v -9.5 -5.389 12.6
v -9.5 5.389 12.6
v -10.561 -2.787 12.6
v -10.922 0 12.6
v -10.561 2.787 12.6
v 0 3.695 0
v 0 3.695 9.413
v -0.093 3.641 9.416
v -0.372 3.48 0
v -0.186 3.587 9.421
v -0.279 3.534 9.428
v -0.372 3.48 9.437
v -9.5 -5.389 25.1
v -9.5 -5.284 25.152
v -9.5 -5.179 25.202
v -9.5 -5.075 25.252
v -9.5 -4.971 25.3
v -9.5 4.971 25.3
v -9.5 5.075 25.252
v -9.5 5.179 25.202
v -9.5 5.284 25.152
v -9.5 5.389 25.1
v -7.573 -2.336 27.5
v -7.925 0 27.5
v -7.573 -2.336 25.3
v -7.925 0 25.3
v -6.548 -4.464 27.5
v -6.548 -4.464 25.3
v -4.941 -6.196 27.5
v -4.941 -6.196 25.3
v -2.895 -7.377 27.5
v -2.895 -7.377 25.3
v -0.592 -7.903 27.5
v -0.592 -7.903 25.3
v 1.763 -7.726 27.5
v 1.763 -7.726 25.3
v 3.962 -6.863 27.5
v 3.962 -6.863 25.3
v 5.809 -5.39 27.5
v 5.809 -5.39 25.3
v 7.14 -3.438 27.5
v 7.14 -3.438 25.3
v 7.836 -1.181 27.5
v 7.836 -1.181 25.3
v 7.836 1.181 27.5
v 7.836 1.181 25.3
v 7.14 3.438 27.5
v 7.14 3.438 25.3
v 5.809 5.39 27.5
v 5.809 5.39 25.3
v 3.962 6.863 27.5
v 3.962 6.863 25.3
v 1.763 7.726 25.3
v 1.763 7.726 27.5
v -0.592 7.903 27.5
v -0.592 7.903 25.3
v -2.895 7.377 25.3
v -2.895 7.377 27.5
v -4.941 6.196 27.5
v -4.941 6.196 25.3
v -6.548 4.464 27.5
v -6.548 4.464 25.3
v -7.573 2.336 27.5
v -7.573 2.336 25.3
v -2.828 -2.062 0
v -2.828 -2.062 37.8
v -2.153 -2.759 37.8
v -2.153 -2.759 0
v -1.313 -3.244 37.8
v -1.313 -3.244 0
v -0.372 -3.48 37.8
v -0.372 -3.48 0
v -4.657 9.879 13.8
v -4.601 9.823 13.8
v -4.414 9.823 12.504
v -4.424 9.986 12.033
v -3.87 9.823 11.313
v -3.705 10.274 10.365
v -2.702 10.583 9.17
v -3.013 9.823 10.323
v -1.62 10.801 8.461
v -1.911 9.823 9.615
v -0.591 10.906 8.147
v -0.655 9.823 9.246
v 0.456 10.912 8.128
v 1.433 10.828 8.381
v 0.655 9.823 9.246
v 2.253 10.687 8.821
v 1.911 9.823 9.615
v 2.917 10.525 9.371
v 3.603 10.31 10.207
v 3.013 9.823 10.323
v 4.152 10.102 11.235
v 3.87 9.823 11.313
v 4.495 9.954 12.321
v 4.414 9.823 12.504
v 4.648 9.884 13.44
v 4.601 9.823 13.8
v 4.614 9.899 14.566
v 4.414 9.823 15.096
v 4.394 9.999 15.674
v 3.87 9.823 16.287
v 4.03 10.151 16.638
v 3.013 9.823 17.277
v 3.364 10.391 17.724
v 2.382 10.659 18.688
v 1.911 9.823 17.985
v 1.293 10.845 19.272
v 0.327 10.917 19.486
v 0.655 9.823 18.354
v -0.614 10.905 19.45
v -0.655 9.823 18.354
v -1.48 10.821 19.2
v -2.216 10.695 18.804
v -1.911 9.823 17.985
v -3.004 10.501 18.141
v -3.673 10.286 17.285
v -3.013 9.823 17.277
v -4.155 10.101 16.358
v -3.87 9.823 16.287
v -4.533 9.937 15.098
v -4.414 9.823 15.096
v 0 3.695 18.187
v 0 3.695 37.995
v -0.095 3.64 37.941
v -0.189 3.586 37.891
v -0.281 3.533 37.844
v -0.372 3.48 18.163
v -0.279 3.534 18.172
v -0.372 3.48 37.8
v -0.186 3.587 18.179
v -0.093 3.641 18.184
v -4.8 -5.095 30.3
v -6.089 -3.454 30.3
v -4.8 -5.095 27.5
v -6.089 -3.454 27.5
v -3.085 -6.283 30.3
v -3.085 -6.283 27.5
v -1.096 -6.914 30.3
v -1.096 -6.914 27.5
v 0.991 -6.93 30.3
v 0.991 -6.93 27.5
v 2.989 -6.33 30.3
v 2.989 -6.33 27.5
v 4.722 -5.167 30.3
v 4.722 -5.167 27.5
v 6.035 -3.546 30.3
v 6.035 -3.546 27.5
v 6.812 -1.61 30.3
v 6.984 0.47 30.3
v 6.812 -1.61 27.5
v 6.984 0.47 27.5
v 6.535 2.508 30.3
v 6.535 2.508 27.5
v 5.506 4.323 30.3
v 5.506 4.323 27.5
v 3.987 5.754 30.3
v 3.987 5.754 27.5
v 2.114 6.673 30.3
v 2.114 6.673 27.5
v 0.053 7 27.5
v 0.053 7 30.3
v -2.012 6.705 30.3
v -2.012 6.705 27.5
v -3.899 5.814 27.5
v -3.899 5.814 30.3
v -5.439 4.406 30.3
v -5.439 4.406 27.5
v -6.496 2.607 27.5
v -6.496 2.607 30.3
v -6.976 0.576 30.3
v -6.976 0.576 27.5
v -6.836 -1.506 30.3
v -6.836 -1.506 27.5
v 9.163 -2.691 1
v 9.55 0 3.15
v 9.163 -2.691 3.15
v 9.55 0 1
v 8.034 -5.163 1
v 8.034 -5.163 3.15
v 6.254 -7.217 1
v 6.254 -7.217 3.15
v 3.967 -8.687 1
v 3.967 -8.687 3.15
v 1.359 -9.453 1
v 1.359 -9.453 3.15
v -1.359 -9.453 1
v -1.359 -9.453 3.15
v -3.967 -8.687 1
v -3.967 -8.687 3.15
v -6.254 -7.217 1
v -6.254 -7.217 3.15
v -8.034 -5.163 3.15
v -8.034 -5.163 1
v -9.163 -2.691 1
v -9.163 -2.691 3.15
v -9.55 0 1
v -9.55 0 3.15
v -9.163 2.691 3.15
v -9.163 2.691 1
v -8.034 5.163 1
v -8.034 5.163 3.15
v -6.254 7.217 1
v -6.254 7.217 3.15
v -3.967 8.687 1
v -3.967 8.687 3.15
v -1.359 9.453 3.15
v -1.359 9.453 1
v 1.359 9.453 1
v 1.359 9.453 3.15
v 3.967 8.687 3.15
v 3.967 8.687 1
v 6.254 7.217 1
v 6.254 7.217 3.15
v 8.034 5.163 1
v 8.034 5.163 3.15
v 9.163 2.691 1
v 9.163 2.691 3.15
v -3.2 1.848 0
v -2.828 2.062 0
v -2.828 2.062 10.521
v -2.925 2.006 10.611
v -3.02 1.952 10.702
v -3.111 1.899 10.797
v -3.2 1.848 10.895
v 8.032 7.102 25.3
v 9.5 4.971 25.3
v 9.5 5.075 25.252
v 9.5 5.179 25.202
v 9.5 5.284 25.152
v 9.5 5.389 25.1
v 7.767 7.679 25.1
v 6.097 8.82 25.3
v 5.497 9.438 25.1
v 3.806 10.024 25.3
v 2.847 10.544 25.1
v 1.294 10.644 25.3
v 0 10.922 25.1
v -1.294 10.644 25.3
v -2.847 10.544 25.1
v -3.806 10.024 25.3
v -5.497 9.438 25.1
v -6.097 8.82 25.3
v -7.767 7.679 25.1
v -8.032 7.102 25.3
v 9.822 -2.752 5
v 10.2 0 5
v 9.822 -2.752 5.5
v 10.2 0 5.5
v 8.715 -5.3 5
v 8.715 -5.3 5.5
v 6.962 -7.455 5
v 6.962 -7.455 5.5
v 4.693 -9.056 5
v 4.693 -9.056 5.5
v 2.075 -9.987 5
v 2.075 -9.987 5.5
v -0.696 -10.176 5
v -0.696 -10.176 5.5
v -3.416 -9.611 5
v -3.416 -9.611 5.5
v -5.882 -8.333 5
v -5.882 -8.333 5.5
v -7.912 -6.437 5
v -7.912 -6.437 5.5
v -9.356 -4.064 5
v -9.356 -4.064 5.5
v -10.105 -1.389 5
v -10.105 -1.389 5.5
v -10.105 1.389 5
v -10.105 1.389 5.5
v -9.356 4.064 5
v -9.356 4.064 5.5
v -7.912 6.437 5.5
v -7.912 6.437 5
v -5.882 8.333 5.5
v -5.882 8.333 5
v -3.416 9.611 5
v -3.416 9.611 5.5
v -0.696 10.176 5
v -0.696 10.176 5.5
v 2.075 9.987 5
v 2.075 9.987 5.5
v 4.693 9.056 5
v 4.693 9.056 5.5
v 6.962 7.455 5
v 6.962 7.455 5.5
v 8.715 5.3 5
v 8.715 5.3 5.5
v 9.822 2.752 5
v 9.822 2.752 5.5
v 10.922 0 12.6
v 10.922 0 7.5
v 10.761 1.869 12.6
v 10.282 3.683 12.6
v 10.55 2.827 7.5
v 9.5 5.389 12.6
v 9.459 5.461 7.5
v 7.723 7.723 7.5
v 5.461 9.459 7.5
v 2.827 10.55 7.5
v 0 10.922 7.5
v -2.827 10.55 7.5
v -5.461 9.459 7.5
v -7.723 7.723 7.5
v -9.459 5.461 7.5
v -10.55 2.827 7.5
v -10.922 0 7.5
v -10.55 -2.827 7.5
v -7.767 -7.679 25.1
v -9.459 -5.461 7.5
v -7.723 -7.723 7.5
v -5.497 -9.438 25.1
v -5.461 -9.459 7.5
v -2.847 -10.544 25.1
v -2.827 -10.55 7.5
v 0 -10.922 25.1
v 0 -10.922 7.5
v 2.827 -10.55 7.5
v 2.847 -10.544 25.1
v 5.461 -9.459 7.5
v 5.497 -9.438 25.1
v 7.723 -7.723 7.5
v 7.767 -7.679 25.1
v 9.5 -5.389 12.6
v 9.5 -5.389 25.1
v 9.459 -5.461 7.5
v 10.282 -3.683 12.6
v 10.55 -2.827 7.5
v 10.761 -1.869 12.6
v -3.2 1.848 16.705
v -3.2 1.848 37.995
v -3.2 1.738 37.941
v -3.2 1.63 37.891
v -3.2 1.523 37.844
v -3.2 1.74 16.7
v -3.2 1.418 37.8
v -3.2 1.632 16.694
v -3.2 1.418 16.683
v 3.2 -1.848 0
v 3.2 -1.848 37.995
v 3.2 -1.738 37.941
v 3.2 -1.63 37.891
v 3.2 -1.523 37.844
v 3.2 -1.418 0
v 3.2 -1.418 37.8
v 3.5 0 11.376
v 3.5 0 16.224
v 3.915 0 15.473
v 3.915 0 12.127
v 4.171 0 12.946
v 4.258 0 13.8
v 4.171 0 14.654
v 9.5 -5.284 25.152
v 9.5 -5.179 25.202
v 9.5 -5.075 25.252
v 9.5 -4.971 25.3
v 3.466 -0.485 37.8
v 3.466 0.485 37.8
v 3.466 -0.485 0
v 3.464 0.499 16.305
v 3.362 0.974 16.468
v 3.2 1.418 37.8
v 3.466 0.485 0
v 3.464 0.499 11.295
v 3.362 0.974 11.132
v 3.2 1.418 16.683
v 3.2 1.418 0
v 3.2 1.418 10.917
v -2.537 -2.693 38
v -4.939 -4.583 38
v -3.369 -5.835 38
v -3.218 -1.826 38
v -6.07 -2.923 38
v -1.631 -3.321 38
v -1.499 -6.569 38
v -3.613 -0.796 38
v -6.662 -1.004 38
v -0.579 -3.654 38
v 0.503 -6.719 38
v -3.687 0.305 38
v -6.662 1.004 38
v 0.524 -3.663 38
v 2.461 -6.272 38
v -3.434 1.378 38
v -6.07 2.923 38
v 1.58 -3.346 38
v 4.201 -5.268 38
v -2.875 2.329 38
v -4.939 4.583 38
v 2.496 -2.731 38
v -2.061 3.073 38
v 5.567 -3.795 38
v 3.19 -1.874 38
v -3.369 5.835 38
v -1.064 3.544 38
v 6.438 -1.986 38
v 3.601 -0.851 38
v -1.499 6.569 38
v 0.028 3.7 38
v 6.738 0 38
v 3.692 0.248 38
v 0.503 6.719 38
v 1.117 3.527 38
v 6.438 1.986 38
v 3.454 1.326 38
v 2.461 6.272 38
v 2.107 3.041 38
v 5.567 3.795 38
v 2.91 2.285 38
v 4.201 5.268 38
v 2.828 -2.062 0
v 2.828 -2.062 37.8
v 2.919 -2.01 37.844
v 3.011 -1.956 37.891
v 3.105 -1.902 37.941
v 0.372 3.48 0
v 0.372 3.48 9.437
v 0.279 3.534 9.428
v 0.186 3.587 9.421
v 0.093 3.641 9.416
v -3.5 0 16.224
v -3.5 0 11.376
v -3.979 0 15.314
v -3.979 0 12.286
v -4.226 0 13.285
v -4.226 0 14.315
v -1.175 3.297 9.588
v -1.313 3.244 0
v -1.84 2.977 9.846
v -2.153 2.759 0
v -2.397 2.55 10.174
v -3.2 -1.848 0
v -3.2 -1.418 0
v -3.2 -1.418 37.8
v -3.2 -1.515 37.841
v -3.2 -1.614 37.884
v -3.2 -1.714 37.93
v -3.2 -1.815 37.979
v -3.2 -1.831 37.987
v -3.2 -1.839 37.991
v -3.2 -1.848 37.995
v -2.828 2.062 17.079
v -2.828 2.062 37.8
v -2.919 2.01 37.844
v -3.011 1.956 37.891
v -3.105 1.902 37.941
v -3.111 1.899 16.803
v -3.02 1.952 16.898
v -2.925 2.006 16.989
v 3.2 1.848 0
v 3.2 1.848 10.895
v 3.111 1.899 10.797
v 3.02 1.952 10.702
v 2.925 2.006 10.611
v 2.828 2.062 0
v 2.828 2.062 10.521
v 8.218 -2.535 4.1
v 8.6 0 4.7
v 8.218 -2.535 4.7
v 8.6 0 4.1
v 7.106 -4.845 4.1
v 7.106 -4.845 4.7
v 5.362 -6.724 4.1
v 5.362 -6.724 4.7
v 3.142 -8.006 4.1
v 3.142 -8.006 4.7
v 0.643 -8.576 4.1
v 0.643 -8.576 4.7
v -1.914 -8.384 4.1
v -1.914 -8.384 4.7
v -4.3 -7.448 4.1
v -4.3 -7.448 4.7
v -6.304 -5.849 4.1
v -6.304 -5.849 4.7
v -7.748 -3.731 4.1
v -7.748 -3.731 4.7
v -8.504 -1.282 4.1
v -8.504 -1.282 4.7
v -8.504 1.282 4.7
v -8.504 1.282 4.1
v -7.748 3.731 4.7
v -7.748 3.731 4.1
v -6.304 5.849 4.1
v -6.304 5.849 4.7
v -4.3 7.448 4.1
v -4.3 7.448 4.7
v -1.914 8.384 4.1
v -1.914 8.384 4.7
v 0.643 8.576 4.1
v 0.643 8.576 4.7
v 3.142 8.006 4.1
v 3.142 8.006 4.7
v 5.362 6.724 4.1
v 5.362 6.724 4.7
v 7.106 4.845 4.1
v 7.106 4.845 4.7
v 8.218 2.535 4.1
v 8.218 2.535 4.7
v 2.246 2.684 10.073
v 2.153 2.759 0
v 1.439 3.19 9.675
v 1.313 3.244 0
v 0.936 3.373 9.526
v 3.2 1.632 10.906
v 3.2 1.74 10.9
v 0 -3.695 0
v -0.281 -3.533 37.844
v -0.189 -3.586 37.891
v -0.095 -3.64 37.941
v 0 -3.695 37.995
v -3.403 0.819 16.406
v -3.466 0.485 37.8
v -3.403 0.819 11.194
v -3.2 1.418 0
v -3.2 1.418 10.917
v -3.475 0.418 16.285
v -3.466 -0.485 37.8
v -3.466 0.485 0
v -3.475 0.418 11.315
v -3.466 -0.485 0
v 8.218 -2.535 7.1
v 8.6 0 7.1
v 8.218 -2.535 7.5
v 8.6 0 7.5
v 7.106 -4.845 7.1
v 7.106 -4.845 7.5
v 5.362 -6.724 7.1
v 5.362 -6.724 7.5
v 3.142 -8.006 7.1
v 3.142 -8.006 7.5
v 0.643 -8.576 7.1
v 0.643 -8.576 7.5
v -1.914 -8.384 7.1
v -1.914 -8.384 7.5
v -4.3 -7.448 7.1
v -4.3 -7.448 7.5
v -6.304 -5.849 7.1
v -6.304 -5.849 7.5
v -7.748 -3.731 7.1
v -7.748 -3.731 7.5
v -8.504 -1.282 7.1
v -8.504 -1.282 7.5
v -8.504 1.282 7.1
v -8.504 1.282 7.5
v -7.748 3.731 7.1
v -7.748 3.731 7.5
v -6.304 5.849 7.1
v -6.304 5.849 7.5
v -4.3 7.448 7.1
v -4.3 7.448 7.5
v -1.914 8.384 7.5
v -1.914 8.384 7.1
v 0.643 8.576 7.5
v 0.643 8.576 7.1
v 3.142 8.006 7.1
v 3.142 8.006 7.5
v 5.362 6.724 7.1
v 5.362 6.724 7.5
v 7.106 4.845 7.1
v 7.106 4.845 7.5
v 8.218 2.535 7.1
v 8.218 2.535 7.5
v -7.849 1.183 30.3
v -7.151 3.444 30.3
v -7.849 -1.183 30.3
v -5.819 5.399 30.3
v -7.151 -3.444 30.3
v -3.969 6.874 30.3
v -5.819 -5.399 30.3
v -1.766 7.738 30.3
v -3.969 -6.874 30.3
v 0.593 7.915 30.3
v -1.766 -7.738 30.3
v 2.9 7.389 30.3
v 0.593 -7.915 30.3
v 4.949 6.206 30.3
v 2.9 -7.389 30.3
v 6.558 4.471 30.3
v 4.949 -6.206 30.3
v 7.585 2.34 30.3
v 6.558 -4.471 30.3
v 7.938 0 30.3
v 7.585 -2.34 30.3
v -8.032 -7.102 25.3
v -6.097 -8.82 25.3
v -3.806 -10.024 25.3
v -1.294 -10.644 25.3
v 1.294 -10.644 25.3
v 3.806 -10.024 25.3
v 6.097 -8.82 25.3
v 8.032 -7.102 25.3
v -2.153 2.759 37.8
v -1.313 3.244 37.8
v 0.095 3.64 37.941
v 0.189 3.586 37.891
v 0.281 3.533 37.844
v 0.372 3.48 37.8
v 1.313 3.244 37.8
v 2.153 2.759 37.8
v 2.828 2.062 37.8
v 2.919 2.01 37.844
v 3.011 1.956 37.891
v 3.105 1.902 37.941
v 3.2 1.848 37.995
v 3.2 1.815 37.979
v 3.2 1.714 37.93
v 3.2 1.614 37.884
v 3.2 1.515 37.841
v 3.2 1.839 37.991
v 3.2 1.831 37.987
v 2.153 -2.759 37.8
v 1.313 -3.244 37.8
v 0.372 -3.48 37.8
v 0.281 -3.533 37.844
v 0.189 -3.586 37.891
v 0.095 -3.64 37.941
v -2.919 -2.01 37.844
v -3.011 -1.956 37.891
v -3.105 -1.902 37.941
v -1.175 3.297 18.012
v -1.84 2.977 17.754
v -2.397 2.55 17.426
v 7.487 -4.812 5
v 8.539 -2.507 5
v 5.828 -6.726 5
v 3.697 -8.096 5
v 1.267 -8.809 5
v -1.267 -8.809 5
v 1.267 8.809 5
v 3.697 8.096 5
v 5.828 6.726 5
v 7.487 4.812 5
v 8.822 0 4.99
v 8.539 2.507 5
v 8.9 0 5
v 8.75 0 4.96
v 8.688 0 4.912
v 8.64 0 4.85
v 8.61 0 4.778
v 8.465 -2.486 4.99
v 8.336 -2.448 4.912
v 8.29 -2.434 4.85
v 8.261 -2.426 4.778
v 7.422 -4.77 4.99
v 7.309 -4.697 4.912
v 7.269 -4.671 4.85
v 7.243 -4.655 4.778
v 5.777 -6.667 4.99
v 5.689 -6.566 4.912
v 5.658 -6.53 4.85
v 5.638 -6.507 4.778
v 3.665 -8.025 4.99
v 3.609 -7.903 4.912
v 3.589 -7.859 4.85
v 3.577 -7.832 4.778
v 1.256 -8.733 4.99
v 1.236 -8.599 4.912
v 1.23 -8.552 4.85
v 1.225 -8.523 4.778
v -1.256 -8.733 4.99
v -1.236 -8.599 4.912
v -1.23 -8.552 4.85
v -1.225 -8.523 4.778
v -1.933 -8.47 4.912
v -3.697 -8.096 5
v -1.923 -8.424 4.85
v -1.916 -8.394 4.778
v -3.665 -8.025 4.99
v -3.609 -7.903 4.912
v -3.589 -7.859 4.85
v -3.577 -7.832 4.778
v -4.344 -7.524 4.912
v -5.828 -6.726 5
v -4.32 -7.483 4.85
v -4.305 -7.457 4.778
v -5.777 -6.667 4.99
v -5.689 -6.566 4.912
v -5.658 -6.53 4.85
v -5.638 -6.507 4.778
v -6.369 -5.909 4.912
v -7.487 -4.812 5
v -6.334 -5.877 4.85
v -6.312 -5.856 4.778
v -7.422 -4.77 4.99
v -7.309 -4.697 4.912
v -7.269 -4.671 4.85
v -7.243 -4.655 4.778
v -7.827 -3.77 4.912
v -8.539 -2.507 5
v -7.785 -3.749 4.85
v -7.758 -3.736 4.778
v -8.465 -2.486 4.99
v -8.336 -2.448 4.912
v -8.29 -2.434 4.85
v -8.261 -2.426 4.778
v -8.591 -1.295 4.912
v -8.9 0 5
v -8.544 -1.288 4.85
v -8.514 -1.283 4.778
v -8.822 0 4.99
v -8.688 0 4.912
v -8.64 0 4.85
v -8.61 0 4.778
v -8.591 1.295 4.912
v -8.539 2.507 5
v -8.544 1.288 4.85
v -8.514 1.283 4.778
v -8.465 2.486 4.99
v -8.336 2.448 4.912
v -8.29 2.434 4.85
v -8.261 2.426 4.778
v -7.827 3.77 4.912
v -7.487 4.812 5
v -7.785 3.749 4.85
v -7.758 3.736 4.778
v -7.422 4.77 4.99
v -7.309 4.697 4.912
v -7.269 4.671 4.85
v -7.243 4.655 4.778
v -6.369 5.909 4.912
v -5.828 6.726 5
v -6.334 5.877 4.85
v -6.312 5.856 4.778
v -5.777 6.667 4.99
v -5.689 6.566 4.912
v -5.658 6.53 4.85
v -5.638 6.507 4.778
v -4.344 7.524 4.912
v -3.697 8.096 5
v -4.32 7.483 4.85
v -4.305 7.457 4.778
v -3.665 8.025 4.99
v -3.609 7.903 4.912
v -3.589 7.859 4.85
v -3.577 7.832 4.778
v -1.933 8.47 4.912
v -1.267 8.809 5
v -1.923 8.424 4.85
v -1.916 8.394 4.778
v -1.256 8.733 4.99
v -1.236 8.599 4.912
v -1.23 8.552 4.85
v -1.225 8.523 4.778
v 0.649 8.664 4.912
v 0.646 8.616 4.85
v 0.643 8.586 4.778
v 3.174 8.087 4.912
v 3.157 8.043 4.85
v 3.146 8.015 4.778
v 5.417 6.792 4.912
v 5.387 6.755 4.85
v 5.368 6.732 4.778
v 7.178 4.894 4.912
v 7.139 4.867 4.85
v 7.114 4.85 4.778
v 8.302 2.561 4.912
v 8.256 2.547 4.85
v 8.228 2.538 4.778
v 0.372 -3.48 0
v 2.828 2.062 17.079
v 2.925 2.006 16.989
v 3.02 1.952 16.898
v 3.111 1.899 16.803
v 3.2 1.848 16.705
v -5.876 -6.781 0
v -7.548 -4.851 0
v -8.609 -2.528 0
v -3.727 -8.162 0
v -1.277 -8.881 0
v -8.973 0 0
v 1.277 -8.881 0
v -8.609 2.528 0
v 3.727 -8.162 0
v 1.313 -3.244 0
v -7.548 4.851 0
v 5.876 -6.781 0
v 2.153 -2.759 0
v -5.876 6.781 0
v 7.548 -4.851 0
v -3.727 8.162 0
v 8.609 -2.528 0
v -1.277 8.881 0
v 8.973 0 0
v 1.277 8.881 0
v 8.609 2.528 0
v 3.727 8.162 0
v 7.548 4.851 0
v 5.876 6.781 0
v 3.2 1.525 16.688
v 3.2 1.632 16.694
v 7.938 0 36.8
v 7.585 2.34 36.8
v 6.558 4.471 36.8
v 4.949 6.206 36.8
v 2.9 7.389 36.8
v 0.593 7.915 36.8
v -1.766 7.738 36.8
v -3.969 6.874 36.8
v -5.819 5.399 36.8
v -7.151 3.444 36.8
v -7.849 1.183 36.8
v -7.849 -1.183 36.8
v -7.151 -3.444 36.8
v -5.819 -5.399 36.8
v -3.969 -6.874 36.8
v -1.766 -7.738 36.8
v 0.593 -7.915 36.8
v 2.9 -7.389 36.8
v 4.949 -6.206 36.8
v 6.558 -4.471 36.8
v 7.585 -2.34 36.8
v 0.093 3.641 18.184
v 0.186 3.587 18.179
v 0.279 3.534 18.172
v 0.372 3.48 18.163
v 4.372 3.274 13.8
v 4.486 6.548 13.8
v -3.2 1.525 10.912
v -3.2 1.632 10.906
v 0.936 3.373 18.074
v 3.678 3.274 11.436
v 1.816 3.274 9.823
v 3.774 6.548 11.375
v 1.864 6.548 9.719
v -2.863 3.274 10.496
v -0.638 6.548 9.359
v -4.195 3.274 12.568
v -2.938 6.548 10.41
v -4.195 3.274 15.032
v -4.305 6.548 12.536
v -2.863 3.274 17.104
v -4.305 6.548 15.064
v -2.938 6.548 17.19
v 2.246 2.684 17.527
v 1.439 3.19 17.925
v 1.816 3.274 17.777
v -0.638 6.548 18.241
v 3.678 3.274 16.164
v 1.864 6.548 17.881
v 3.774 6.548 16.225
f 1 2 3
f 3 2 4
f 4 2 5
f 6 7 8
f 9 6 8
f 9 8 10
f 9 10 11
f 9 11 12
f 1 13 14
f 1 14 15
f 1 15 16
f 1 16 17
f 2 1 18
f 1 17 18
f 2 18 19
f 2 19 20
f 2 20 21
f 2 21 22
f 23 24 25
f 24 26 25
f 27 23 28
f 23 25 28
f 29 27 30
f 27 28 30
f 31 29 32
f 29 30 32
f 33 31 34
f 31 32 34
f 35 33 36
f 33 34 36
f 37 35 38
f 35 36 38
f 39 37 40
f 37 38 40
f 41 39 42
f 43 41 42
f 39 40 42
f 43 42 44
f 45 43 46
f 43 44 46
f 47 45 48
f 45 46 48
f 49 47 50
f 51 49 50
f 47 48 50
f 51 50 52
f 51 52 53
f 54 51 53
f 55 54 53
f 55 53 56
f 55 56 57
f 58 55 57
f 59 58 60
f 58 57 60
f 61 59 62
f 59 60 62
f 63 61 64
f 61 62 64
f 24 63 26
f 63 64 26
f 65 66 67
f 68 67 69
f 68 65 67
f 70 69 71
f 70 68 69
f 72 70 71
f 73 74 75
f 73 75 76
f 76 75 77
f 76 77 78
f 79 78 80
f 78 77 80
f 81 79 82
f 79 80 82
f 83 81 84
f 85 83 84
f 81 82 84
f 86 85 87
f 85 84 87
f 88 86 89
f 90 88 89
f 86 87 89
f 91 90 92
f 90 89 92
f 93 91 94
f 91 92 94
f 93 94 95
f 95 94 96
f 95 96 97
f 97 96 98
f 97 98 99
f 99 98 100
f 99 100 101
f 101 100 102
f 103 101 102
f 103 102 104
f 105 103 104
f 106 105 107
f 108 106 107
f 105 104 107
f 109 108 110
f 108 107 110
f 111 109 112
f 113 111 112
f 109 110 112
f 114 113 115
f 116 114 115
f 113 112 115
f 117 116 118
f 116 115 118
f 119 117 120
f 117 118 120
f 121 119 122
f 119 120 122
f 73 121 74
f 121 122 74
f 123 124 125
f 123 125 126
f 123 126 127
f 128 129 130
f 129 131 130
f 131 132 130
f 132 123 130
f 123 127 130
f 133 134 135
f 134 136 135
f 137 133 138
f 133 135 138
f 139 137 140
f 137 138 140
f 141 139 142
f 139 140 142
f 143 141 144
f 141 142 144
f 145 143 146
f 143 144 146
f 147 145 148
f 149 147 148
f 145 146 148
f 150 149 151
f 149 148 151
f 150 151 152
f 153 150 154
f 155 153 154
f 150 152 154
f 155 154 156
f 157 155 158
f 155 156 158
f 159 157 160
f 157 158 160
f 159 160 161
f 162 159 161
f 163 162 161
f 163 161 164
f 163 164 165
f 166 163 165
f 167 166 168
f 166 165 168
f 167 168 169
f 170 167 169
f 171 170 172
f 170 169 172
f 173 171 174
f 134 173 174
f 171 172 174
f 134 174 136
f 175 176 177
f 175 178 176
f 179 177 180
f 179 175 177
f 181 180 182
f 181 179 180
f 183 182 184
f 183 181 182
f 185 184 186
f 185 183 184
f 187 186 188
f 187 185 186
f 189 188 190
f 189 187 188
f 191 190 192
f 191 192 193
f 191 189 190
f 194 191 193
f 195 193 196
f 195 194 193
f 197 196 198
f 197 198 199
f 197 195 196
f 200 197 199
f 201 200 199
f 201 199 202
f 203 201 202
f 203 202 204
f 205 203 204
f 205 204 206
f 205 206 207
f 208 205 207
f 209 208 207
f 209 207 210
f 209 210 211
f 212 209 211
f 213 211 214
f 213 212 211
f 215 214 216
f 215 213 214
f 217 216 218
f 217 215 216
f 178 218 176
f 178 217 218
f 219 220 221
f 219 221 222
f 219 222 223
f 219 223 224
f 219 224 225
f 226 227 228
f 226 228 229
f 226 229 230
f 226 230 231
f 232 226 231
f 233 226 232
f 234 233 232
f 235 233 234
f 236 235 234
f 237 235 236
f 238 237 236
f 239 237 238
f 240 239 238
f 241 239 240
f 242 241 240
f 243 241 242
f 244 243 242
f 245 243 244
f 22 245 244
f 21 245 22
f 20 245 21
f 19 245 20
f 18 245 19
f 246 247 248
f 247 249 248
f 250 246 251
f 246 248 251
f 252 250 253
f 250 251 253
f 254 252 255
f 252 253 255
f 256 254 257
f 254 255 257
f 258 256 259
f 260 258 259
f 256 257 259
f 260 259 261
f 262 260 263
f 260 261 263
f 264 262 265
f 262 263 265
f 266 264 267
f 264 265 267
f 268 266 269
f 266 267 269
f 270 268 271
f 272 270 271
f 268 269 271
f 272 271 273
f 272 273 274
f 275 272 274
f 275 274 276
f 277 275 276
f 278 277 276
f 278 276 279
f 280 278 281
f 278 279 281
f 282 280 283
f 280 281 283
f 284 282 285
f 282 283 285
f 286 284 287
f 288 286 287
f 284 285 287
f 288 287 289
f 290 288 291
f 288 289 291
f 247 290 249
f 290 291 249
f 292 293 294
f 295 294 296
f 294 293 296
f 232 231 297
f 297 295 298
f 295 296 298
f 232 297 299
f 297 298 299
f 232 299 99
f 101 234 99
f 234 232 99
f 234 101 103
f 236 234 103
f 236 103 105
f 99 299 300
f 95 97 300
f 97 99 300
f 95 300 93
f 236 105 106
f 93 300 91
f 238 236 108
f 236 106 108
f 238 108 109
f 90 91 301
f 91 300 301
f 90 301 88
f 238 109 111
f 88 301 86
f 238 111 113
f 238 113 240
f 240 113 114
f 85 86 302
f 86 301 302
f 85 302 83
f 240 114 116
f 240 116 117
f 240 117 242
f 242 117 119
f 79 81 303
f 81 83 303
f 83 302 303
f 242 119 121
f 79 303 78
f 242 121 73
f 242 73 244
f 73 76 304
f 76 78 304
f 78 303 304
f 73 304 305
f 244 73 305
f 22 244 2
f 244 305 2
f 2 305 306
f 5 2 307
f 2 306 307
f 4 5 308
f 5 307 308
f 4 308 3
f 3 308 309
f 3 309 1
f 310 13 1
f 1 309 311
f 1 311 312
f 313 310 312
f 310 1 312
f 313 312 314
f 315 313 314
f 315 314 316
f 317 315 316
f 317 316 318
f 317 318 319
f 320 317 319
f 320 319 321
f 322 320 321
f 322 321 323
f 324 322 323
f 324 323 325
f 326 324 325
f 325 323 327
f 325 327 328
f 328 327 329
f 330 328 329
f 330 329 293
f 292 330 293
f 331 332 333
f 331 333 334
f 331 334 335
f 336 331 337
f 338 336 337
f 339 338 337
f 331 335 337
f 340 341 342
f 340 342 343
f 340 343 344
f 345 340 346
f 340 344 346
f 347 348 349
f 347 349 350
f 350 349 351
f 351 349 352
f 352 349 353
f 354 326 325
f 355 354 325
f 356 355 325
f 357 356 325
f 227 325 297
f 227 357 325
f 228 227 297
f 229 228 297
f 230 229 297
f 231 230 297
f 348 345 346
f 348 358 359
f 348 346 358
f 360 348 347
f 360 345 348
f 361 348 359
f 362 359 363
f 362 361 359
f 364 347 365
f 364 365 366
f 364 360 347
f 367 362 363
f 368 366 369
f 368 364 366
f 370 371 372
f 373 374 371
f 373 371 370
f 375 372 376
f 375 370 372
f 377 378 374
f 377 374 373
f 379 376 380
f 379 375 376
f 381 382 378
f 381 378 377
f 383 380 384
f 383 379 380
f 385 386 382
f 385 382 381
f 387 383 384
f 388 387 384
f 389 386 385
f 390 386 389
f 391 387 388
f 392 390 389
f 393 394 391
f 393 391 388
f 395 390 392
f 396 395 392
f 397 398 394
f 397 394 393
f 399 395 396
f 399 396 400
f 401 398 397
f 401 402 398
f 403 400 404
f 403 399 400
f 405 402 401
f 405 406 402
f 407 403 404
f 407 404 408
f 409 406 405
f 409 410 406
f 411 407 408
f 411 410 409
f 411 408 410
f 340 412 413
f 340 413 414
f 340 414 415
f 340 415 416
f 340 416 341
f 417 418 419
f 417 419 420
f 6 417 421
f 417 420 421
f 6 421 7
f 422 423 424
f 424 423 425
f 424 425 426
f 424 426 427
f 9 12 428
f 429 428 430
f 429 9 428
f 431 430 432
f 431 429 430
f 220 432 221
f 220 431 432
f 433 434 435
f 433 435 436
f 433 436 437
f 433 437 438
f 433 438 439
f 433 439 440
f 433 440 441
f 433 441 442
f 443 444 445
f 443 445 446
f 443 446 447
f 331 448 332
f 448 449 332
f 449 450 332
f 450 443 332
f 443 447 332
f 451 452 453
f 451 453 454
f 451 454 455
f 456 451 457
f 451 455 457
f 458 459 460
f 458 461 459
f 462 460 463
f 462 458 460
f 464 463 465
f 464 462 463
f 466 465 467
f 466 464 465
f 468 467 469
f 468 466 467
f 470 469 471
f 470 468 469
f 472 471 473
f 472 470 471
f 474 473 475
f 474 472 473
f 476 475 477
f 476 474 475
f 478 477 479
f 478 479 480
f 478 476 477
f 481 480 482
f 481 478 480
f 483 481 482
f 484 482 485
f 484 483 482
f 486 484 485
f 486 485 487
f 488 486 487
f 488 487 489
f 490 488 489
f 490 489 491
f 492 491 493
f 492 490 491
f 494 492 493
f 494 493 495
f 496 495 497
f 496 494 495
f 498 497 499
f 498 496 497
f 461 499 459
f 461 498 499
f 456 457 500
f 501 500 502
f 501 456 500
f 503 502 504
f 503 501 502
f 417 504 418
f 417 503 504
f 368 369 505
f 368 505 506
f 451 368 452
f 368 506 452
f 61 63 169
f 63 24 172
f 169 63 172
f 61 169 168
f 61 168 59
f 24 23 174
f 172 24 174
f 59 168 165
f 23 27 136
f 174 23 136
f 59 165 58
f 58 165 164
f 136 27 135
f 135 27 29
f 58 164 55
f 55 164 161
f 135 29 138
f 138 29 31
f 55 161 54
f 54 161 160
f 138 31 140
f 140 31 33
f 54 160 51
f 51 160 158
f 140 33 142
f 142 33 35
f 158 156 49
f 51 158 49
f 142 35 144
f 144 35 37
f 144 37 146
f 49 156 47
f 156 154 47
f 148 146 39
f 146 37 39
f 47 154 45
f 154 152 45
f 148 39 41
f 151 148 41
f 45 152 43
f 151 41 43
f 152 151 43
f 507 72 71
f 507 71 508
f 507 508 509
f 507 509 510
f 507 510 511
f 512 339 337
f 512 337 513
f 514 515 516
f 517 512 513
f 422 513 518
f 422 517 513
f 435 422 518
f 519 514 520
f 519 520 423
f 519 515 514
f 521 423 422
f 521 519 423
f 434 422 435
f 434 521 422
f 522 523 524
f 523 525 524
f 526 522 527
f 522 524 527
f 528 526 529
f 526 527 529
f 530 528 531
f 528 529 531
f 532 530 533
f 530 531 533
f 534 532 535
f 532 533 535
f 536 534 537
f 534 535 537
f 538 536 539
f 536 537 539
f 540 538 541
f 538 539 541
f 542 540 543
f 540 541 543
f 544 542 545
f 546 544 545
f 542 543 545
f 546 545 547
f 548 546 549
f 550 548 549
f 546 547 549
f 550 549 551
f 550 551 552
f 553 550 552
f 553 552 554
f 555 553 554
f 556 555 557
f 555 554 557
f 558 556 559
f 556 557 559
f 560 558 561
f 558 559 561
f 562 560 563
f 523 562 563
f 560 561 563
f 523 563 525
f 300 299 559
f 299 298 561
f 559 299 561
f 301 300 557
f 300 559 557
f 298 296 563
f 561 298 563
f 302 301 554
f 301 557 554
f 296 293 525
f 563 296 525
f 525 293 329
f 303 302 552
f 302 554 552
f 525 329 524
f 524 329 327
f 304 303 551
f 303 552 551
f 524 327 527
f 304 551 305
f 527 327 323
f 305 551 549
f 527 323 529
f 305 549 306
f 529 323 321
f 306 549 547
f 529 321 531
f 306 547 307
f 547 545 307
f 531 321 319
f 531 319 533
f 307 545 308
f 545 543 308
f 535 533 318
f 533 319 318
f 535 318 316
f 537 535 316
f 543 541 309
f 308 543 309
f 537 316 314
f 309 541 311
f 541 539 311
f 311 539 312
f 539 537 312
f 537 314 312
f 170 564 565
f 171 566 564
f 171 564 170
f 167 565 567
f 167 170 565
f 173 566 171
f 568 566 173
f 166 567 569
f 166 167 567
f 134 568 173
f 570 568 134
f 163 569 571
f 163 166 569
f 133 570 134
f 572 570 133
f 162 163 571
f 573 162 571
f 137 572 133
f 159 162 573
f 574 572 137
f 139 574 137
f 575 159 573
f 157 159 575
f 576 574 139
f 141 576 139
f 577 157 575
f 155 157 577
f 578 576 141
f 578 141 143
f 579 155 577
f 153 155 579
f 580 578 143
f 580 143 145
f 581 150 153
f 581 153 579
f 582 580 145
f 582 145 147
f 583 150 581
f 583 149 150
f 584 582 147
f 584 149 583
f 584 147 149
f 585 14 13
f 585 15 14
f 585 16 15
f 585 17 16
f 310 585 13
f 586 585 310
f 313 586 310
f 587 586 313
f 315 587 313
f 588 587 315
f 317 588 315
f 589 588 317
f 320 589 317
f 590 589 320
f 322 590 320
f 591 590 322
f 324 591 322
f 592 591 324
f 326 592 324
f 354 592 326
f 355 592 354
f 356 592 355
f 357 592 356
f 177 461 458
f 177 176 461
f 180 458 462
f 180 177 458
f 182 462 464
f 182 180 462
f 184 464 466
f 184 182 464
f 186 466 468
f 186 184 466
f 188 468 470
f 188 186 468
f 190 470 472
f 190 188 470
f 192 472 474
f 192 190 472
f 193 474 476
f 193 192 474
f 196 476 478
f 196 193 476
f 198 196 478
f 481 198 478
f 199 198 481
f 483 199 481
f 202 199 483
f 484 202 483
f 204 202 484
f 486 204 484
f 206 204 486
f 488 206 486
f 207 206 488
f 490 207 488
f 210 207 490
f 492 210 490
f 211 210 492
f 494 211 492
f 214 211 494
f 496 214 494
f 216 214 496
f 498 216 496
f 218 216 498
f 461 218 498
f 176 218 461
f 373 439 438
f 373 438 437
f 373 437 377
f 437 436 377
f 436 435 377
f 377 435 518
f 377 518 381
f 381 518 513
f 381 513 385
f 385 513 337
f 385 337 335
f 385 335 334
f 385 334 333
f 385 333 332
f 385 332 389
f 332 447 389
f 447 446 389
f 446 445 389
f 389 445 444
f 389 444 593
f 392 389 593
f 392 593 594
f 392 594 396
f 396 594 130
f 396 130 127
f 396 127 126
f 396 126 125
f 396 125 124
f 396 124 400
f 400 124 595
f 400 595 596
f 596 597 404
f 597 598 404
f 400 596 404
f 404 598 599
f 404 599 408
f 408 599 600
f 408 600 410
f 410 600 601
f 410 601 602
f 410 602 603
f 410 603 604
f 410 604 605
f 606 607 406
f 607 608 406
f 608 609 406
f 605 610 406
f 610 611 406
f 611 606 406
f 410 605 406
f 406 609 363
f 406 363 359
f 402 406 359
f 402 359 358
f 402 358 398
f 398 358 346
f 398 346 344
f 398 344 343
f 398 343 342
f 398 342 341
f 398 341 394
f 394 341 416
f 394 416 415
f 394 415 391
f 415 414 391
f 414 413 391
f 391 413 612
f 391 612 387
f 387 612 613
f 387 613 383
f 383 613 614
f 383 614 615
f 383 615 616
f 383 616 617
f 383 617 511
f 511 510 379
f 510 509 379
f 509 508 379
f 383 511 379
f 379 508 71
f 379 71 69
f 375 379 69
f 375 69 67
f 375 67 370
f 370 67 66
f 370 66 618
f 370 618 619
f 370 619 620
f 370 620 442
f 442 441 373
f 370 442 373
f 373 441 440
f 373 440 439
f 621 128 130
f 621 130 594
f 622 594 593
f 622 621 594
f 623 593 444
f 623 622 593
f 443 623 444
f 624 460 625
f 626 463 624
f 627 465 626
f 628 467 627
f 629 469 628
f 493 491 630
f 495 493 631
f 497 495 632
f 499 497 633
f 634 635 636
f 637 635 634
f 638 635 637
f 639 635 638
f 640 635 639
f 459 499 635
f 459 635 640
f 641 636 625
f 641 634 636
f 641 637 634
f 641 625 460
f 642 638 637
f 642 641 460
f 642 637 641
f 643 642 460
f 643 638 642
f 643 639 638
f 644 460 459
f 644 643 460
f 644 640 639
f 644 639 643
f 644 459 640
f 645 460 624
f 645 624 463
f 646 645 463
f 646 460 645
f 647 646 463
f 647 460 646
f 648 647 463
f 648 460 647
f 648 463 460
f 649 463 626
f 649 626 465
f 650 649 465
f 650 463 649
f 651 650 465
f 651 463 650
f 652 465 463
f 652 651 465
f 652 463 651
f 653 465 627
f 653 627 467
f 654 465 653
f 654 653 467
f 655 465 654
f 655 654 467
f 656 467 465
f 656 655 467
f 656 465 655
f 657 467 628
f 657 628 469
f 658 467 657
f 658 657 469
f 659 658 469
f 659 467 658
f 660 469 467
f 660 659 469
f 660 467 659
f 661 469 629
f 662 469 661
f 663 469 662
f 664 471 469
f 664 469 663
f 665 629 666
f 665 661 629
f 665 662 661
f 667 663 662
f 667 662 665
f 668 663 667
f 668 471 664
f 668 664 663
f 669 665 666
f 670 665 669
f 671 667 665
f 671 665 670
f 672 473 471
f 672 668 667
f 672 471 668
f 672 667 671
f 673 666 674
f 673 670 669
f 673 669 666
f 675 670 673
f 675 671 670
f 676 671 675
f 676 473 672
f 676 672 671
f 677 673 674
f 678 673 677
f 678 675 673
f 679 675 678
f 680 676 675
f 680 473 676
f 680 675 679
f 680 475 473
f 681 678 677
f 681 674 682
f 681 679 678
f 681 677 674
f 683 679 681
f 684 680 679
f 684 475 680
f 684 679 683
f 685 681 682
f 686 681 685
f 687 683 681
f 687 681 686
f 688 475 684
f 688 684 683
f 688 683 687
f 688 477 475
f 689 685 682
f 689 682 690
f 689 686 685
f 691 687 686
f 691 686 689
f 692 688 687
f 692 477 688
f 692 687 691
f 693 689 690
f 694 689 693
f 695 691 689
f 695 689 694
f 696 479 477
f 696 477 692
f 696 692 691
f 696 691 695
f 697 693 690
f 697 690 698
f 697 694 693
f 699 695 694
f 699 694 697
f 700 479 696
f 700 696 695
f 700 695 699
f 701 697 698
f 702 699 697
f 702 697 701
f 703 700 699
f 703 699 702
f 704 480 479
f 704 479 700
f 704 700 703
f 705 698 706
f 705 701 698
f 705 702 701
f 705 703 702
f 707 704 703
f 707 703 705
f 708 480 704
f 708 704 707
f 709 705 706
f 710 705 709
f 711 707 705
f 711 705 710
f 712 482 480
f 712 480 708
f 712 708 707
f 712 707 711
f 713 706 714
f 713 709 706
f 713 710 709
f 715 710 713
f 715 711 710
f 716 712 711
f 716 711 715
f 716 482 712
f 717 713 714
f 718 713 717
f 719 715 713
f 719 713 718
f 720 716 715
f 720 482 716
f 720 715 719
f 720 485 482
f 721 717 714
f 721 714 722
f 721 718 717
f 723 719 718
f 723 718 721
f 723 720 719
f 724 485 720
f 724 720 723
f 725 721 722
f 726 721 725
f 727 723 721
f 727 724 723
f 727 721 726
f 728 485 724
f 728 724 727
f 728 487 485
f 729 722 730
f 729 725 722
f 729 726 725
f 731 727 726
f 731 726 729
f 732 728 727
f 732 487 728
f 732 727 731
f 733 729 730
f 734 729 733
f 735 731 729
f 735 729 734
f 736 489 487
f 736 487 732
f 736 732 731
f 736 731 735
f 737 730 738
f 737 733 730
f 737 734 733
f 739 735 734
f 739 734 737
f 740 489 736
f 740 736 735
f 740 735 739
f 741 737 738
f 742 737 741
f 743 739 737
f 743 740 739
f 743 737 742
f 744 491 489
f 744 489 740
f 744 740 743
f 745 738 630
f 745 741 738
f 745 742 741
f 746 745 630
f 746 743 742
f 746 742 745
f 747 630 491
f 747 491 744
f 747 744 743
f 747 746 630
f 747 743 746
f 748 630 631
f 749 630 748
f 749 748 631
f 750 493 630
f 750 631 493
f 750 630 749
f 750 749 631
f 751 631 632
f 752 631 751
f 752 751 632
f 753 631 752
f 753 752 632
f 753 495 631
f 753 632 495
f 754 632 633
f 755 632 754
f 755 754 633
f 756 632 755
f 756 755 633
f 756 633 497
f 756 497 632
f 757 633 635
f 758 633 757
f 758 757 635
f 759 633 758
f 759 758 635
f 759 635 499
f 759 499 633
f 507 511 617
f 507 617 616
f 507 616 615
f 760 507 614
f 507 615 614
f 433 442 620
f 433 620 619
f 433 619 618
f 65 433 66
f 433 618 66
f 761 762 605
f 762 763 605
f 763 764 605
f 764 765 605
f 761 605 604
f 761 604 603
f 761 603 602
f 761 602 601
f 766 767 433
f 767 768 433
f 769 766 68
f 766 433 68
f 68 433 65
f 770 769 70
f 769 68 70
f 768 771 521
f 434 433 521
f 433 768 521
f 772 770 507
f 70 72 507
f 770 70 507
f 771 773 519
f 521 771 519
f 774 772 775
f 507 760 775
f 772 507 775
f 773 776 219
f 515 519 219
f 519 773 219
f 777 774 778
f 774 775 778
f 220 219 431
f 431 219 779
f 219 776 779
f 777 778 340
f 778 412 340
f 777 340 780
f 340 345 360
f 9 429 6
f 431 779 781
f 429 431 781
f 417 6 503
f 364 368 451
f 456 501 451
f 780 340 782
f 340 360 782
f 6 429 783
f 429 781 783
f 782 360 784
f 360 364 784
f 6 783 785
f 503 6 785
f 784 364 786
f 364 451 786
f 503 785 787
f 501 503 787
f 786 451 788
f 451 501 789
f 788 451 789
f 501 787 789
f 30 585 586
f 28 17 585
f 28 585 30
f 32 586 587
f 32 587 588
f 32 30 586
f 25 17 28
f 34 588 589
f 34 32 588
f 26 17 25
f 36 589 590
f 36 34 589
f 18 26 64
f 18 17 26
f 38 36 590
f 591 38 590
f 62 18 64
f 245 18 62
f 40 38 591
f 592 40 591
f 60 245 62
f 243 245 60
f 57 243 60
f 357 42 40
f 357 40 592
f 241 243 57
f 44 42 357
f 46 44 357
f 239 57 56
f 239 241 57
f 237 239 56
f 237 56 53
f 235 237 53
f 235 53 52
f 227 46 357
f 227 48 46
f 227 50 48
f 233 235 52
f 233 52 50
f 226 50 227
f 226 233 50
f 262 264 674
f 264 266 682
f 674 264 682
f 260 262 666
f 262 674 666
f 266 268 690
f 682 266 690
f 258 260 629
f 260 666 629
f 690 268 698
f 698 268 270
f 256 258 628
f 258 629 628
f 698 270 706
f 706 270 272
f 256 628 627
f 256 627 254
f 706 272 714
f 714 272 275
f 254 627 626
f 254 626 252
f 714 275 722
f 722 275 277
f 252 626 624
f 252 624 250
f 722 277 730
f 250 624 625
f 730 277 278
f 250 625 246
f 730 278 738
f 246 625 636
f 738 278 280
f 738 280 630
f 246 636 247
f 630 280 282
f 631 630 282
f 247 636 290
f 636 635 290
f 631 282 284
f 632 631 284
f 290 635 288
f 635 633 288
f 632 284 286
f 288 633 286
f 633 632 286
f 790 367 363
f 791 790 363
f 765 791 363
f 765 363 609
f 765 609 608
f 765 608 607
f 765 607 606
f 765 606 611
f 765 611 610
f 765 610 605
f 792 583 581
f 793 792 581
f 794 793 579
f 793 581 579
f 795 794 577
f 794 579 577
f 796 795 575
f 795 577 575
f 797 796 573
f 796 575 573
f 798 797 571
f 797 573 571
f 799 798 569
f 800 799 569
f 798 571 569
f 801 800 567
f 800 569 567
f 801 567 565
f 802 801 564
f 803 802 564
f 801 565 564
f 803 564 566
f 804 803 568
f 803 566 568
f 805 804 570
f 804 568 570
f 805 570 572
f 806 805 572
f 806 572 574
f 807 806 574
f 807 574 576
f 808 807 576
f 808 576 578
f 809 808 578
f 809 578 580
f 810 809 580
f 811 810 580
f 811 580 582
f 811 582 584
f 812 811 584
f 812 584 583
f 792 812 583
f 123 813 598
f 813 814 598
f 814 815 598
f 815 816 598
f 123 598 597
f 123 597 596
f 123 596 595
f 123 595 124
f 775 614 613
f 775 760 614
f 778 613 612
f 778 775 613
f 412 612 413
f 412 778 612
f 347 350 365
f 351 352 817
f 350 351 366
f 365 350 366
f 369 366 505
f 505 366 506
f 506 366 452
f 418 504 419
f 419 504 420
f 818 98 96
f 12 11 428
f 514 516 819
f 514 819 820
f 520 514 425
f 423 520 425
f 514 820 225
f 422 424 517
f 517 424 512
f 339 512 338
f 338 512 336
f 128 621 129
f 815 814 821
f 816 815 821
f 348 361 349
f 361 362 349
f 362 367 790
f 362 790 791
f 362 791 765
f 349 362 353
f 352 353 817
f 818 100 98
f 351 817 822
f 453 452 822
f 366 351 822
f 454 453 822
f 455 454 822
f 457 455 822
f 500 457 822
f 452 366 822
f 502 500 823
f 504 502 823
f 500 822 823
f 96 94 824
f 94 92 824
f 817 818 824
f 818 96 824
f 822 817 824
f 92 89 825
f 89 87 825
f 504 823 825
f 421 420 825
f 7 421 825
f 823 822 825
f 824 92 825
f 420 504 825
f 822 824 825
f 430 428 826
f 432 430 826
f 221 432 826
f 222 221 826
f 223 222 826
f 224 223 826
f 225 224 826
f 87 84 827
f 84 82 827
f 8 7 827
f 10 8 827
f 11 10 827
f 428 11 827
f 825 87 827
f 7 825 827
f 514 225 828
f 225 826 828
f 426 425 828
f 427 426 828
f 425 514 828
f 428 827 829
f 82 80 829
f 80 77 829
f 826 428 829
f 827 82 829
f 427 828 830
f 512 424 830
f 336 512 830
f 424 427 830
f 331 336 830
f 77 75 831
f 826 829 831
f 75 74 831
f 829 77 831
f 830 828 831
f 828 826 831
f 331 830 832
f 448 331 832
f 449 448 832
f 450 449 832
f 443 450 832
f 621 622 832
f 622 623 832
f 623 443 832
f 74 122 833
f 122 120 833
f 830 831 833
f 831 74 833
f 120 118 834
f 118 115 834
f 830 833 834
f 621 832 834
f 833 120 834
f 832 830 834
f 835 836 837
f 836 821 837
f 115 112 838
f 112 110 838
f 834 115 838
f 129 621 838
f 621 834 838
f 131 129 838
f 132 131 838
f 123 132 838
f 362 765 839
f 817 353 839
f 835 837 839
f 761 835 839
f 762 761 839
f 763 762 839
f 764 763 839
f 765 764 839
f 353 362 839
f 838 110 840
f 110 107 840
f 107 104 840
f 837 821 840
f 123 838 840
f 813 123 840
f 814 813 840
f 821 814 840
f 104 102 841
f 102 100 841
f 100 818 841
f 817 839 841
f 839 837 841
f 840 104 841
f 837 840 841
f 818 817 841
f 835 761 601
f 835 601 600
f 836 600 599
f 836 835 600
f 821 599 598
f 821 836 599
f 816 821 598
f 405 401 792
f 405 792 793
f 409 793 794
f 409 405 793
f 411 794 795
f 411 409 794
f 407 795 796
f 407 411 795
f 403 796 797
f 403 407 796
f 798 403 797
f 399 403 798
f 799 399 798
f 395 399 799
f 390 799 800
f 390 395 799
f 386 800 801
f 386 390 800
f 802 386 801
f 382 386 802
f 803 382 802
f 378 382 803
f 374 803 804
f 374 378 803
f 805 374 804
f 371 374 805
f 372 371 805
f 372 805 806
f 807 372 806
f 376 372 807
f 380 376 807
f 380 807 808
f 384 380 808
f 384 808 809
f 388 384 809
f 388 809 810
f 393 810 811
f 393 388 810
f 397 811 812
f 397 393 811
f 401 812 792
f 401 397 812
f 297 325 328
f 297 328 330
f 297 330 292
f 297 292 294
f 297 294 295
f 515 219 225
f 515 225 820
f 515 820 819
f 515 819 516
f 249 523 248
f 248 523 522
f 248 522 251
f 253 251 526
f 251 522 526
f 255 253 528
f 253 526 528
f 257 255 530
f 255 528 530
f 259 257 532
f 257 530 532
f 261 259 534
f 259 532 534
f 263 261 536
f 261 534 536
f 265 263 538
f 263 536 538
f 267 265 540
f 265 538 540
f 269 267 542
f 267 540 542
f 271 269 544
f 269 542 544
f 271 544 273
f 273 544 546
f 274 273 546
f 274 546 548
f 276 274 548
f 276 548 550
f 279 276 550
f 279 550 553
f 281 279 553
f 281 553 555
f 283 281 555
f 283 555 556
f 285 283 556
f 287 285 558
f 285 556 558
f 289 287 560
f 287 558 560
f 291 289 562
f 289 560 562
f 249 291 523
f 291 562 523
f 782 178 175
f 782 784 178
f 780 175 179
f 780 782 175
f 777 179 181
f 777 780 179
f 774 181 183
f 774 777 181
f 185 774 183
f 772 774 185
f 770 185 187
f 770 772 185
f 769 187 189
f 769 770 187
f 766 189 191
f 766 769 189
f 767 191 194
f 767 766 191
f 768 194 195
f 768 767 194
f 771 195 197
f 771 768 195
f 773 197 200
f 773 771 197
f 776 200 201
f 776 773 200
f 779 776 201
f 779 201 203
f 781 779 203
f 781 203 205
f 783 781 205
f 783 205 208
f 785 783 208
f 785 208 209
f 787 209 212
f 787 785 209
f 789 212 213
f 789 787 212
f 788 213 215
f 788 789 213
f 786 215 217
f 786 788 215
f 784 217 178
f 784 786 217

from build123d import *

# Parameters (mm, degrees)
SKETCH1_R               = 9.55
TUBEINTERFACE1_DEPTH    = 5
SKETCH3_R               = 10.922
BODY_DEPTH              = 20.3
BODYCHAMFER_SIZE        = 0.2
SKETCH4_W               = 10
SKETCH4_H               = 75
FLATS_DEPTH             = 12.7
SKETCH5_R               = 7.9375
MOUNTTHREAD1_DEPTH      = 12.7
MOUNTTHREADCHAMFER_SIZE = 1.2
SKETCH17_W              = 2.8
SKETCH17_H              = 5
SKETCH8_R               = 3.5
THRUBORE_DEPTH          = 42.019265815
THRUBORE2_DEPTH         = 38
SKETCH16_R              = 4.639
PORT2_DEPTH             = 10.922
PORT2_DRAFT             = -2
SKETCH26_W              = 2.2
SKETCH26_H              = 0.0127


with BuildPart() as part:
    # Sketch1 → TubeInterface1 (new body)
    with BuildSketch(Plane.XY):
        Circle(SKETCH1_R)
    extrude(amount=TUBEINTERFACE1_DEPTH)

    # Sketch3 → Body (add)
    with BuildSketch(Plane.XY.offset(5)):
        Circle(SKETCH3_R)
    extrude(amount=BODY_DEPTH)

    # BodyChamfer
    bodychamfer_edges = [part.edges().sort_by_distance(p)[0] for p in [
        (-10.922, 0, 25.3),
    ]]
    chamfer(bodychamfer_edges, length=BODYCHAMFER_SIZE)

    # Sketch4 → Flats (cut)
    with BuildSketch(Plane.XY.offset(25.3)):
        with Locations((-14.5, 0)):
            Rectangle(SKETCH4_W, SKETCH4_H)
        with Locations((14.5, 0)):
            Rectangle(SKETCH4_W, SKETCH4_H)
    extrude(amount=-FLATS_DEPTH, mode=Mode.SUBTRACT)

    # Sketch5 → MountThread1 (add)
    with BuildSketch(Plane.XY.offset(25.3)):
        Circle(SKETCH5_R)
    extrude(amount=MOUNTTHREAD1_DEPTH)

    # MountThreadChamfer
    mountthreadchamfer_edges = [part.edges().sort_by_distance(p)[0] for p in [
        (-7.9375, 0, 38),
    ]]
    chamfer(mountthreadchamfer_edges, length=MOUNTTHREADCHAMFER_SIZE)

    # Sketch17 → Cut-Revolve1 (revolve, cut)
    with BuildSketch(Plane(origin=(0, 0, 0), x_dir=(0, 0, -1), z_dir=(1, 0, 0)), mode=Mode.PRIVATE) as cut_revolve1_sk:
        with Locations((-28.9, 9.5)):
            Rectangle(SKETCH17_W, SKETCH17_H)
    revolve(cut_revolve1_sk.sketch.rotate(Axis((0, 0, 0), (0, 0, 1)), 119.564121408), axis=Axis((0, 0, 0), (0, 0, 1)), mode=Mode.SUBTRACT)

    # Sketch8 → ThruBore (cut, through all)
    with BuildSketch(Plane.XY):
        Circle(SKETCH8_R)
    extrude(amount=THRUBORE_DEPTH, mode=Mode.SUBTRACT)

    # Sketch21 → ThruBore2 (cut)
    with BuildSketch(Plane.XY.offset(38)):
        Polygon((3.2, -1.847520861), (3.2, 1.847520861), (0, 3.695041723), (-3.2, 1.847520861), (-3.2, -1.847520861), (0, -3.695041723), align=None)
    extrude(amount=-THRUBORE2_DEPTH, mode=Mode.SUBTRACT)

    # Sketch25 → Chamfer1 (revolve, cut)
    with BuildSketch(Plane(origin=(0, 0, 0), x_dir=(0, 0, -1), z_dir=(1, 0, 0)), mode=Mode.PRIVATE) as chamfer1_sk:
        Polygon((-38, 3.7), (-36, 1.7), (-38, 1.7), align=None)
        Polygon((-38, -3.7), (-36, -1.7), (-38, -1.7), align=None)
    revolve(chamfer1_sk.sketch.rotate(Axis((0, 0, 23.920180356), (0, 0, -1)), 240.435878592), axis=Axis((0, 0, 23.920180356), (0, 0, -1)), mode=Mode.SUBTRACT)


with BuildPart() as port2_tool:
    # Sketch16 → Port2 (with draft: the straight prism first)
    with BuildSketch(Plane(origin=(0, 10.922, 15.05), x_dir=(1, 0, 0), z_dir=(0, 1, 0))):
        with Locations((0, 1.25)):
            Circle(SKETCH16_R)
    extrude(amount=-PORT2_DEPTH)
    # Port2: the draft: its side faces are tilted about the plane it starts from
    port2_sides = [port2_tool.faces().sort_by_distance(p)[0] for p in [
        (-4.639, 5.461, 13.8),
    ]]
    draft(port2_sides, Plane(origin=(0, 10.922, 15.05), x_dir=(1, 0, 0), z_dir=(0, 1, 0)), PORT2_DRAFT)


with BuildPart() as part_1:
    add(part.part)

    # Port2: cut by port2_tool
    add(port2_tool.part, mode=Mode.SUBTRACT)

    # Sketch22 → PortChamfer (revolve, cut)
    with BuildSketch(Plane(origin=(0, 0, 0), x_dir=(0, 0, -1), z_dir=(1, 0, 0)), mode=Mode.PRIVATE) as portchamfer_sk:
        Polygon((-15.8, 10.922), (-19.5, 10.922), (-15.8, 7.222), align=None)
    revolve(portchamfer_sk.sketch.rotate(Axis((0, 0, 13.8), (0, -1, 0)), 90), axis=Axis((0, 0, 13.8), (0, -1, 0)), mode=Mode.SUBTRACT)

    # Sketch23 → RodCoverCrimp (revolve, cut)
    with BuildSketch(Plane(origin=(0, 0, 0), x_dir=(0, 0, -1), z_dir=(1, 0, 0)), mode=Mode.PRIVATE) as rodcovercrimp_sk:
        Polygon((-7.5, 13.6), (-5, 13.6), (-5, 10.2), (-5.5, 10.2), (-7.1, 8.6), (-7.5, 8.6), align=None)
    revolve(rodcovercrimp_sk.sketch.rotate(Axis((0, 0, 0), (0, 0, -1)), 90), axis=Axis((0, 0, 0), (0, 0, -1)), mode=Mode.SUBTRACT)

    # Sketch24 → TubeInterfaceCrimp (revolve, cut)
    with BuildSketch(Plane(origin=(0, 0, 0), x_dir=(0, 0, -1), z_dir=(1, 0, 0)), mode=Mode.PRIVATE) as tubeinterfacecrimp_sk:
        with BuildLine():
            Line((-5, 14.7), (-5, 8.9))
            ThreePointArc((-5, 8.9), (-4.912132034, 8.687867966), (-4.7, 8.6))
            Line((-4.7, 8.6), (-4.1, 8.6))
            Line((-4.1, 8.6), (-3.15, 9.55))
            Line((-3.15, 9.55), (-1, 9.55))
            Line((-1, 9.55), (0, 8.972649731))
            Line((0, 8.972649731), (0, 14.7))
            Line((0, 14.7), (-5, 14.7))
        make_face()
    revolve(tubeinterfacecrimp_sk.sketch.rotate(Axis((0, 0, 0), (0, 0, -1)), 90), axis=Axis((0, 0, 0), (0, 0, -1)), mode=Mode.SUBTRACT)

    # Sketch26 → Cut-Revolve2 (revolve, cut)
    with BuildSketch(Plane(origin=(0, 0, 0), x_dir=(0, 0, -1), z_dir=(1, 0, 0)), mode=Mode.PRIVATE) as cut_revolve2_sk:
        with Locations((-26.4, 7.93115)):
            Rectangle(SKETCH26_W, SKETCH26_H)
    revolve(cut_revolve2_sk.sketch.rotate(Axis((0, 0, 38), (0, 0, 1)), 90), axis=Axis((0, 0, 38), (0, 0, 1)), mode=Mode.SUBTRACT)


solid = part_1.part
